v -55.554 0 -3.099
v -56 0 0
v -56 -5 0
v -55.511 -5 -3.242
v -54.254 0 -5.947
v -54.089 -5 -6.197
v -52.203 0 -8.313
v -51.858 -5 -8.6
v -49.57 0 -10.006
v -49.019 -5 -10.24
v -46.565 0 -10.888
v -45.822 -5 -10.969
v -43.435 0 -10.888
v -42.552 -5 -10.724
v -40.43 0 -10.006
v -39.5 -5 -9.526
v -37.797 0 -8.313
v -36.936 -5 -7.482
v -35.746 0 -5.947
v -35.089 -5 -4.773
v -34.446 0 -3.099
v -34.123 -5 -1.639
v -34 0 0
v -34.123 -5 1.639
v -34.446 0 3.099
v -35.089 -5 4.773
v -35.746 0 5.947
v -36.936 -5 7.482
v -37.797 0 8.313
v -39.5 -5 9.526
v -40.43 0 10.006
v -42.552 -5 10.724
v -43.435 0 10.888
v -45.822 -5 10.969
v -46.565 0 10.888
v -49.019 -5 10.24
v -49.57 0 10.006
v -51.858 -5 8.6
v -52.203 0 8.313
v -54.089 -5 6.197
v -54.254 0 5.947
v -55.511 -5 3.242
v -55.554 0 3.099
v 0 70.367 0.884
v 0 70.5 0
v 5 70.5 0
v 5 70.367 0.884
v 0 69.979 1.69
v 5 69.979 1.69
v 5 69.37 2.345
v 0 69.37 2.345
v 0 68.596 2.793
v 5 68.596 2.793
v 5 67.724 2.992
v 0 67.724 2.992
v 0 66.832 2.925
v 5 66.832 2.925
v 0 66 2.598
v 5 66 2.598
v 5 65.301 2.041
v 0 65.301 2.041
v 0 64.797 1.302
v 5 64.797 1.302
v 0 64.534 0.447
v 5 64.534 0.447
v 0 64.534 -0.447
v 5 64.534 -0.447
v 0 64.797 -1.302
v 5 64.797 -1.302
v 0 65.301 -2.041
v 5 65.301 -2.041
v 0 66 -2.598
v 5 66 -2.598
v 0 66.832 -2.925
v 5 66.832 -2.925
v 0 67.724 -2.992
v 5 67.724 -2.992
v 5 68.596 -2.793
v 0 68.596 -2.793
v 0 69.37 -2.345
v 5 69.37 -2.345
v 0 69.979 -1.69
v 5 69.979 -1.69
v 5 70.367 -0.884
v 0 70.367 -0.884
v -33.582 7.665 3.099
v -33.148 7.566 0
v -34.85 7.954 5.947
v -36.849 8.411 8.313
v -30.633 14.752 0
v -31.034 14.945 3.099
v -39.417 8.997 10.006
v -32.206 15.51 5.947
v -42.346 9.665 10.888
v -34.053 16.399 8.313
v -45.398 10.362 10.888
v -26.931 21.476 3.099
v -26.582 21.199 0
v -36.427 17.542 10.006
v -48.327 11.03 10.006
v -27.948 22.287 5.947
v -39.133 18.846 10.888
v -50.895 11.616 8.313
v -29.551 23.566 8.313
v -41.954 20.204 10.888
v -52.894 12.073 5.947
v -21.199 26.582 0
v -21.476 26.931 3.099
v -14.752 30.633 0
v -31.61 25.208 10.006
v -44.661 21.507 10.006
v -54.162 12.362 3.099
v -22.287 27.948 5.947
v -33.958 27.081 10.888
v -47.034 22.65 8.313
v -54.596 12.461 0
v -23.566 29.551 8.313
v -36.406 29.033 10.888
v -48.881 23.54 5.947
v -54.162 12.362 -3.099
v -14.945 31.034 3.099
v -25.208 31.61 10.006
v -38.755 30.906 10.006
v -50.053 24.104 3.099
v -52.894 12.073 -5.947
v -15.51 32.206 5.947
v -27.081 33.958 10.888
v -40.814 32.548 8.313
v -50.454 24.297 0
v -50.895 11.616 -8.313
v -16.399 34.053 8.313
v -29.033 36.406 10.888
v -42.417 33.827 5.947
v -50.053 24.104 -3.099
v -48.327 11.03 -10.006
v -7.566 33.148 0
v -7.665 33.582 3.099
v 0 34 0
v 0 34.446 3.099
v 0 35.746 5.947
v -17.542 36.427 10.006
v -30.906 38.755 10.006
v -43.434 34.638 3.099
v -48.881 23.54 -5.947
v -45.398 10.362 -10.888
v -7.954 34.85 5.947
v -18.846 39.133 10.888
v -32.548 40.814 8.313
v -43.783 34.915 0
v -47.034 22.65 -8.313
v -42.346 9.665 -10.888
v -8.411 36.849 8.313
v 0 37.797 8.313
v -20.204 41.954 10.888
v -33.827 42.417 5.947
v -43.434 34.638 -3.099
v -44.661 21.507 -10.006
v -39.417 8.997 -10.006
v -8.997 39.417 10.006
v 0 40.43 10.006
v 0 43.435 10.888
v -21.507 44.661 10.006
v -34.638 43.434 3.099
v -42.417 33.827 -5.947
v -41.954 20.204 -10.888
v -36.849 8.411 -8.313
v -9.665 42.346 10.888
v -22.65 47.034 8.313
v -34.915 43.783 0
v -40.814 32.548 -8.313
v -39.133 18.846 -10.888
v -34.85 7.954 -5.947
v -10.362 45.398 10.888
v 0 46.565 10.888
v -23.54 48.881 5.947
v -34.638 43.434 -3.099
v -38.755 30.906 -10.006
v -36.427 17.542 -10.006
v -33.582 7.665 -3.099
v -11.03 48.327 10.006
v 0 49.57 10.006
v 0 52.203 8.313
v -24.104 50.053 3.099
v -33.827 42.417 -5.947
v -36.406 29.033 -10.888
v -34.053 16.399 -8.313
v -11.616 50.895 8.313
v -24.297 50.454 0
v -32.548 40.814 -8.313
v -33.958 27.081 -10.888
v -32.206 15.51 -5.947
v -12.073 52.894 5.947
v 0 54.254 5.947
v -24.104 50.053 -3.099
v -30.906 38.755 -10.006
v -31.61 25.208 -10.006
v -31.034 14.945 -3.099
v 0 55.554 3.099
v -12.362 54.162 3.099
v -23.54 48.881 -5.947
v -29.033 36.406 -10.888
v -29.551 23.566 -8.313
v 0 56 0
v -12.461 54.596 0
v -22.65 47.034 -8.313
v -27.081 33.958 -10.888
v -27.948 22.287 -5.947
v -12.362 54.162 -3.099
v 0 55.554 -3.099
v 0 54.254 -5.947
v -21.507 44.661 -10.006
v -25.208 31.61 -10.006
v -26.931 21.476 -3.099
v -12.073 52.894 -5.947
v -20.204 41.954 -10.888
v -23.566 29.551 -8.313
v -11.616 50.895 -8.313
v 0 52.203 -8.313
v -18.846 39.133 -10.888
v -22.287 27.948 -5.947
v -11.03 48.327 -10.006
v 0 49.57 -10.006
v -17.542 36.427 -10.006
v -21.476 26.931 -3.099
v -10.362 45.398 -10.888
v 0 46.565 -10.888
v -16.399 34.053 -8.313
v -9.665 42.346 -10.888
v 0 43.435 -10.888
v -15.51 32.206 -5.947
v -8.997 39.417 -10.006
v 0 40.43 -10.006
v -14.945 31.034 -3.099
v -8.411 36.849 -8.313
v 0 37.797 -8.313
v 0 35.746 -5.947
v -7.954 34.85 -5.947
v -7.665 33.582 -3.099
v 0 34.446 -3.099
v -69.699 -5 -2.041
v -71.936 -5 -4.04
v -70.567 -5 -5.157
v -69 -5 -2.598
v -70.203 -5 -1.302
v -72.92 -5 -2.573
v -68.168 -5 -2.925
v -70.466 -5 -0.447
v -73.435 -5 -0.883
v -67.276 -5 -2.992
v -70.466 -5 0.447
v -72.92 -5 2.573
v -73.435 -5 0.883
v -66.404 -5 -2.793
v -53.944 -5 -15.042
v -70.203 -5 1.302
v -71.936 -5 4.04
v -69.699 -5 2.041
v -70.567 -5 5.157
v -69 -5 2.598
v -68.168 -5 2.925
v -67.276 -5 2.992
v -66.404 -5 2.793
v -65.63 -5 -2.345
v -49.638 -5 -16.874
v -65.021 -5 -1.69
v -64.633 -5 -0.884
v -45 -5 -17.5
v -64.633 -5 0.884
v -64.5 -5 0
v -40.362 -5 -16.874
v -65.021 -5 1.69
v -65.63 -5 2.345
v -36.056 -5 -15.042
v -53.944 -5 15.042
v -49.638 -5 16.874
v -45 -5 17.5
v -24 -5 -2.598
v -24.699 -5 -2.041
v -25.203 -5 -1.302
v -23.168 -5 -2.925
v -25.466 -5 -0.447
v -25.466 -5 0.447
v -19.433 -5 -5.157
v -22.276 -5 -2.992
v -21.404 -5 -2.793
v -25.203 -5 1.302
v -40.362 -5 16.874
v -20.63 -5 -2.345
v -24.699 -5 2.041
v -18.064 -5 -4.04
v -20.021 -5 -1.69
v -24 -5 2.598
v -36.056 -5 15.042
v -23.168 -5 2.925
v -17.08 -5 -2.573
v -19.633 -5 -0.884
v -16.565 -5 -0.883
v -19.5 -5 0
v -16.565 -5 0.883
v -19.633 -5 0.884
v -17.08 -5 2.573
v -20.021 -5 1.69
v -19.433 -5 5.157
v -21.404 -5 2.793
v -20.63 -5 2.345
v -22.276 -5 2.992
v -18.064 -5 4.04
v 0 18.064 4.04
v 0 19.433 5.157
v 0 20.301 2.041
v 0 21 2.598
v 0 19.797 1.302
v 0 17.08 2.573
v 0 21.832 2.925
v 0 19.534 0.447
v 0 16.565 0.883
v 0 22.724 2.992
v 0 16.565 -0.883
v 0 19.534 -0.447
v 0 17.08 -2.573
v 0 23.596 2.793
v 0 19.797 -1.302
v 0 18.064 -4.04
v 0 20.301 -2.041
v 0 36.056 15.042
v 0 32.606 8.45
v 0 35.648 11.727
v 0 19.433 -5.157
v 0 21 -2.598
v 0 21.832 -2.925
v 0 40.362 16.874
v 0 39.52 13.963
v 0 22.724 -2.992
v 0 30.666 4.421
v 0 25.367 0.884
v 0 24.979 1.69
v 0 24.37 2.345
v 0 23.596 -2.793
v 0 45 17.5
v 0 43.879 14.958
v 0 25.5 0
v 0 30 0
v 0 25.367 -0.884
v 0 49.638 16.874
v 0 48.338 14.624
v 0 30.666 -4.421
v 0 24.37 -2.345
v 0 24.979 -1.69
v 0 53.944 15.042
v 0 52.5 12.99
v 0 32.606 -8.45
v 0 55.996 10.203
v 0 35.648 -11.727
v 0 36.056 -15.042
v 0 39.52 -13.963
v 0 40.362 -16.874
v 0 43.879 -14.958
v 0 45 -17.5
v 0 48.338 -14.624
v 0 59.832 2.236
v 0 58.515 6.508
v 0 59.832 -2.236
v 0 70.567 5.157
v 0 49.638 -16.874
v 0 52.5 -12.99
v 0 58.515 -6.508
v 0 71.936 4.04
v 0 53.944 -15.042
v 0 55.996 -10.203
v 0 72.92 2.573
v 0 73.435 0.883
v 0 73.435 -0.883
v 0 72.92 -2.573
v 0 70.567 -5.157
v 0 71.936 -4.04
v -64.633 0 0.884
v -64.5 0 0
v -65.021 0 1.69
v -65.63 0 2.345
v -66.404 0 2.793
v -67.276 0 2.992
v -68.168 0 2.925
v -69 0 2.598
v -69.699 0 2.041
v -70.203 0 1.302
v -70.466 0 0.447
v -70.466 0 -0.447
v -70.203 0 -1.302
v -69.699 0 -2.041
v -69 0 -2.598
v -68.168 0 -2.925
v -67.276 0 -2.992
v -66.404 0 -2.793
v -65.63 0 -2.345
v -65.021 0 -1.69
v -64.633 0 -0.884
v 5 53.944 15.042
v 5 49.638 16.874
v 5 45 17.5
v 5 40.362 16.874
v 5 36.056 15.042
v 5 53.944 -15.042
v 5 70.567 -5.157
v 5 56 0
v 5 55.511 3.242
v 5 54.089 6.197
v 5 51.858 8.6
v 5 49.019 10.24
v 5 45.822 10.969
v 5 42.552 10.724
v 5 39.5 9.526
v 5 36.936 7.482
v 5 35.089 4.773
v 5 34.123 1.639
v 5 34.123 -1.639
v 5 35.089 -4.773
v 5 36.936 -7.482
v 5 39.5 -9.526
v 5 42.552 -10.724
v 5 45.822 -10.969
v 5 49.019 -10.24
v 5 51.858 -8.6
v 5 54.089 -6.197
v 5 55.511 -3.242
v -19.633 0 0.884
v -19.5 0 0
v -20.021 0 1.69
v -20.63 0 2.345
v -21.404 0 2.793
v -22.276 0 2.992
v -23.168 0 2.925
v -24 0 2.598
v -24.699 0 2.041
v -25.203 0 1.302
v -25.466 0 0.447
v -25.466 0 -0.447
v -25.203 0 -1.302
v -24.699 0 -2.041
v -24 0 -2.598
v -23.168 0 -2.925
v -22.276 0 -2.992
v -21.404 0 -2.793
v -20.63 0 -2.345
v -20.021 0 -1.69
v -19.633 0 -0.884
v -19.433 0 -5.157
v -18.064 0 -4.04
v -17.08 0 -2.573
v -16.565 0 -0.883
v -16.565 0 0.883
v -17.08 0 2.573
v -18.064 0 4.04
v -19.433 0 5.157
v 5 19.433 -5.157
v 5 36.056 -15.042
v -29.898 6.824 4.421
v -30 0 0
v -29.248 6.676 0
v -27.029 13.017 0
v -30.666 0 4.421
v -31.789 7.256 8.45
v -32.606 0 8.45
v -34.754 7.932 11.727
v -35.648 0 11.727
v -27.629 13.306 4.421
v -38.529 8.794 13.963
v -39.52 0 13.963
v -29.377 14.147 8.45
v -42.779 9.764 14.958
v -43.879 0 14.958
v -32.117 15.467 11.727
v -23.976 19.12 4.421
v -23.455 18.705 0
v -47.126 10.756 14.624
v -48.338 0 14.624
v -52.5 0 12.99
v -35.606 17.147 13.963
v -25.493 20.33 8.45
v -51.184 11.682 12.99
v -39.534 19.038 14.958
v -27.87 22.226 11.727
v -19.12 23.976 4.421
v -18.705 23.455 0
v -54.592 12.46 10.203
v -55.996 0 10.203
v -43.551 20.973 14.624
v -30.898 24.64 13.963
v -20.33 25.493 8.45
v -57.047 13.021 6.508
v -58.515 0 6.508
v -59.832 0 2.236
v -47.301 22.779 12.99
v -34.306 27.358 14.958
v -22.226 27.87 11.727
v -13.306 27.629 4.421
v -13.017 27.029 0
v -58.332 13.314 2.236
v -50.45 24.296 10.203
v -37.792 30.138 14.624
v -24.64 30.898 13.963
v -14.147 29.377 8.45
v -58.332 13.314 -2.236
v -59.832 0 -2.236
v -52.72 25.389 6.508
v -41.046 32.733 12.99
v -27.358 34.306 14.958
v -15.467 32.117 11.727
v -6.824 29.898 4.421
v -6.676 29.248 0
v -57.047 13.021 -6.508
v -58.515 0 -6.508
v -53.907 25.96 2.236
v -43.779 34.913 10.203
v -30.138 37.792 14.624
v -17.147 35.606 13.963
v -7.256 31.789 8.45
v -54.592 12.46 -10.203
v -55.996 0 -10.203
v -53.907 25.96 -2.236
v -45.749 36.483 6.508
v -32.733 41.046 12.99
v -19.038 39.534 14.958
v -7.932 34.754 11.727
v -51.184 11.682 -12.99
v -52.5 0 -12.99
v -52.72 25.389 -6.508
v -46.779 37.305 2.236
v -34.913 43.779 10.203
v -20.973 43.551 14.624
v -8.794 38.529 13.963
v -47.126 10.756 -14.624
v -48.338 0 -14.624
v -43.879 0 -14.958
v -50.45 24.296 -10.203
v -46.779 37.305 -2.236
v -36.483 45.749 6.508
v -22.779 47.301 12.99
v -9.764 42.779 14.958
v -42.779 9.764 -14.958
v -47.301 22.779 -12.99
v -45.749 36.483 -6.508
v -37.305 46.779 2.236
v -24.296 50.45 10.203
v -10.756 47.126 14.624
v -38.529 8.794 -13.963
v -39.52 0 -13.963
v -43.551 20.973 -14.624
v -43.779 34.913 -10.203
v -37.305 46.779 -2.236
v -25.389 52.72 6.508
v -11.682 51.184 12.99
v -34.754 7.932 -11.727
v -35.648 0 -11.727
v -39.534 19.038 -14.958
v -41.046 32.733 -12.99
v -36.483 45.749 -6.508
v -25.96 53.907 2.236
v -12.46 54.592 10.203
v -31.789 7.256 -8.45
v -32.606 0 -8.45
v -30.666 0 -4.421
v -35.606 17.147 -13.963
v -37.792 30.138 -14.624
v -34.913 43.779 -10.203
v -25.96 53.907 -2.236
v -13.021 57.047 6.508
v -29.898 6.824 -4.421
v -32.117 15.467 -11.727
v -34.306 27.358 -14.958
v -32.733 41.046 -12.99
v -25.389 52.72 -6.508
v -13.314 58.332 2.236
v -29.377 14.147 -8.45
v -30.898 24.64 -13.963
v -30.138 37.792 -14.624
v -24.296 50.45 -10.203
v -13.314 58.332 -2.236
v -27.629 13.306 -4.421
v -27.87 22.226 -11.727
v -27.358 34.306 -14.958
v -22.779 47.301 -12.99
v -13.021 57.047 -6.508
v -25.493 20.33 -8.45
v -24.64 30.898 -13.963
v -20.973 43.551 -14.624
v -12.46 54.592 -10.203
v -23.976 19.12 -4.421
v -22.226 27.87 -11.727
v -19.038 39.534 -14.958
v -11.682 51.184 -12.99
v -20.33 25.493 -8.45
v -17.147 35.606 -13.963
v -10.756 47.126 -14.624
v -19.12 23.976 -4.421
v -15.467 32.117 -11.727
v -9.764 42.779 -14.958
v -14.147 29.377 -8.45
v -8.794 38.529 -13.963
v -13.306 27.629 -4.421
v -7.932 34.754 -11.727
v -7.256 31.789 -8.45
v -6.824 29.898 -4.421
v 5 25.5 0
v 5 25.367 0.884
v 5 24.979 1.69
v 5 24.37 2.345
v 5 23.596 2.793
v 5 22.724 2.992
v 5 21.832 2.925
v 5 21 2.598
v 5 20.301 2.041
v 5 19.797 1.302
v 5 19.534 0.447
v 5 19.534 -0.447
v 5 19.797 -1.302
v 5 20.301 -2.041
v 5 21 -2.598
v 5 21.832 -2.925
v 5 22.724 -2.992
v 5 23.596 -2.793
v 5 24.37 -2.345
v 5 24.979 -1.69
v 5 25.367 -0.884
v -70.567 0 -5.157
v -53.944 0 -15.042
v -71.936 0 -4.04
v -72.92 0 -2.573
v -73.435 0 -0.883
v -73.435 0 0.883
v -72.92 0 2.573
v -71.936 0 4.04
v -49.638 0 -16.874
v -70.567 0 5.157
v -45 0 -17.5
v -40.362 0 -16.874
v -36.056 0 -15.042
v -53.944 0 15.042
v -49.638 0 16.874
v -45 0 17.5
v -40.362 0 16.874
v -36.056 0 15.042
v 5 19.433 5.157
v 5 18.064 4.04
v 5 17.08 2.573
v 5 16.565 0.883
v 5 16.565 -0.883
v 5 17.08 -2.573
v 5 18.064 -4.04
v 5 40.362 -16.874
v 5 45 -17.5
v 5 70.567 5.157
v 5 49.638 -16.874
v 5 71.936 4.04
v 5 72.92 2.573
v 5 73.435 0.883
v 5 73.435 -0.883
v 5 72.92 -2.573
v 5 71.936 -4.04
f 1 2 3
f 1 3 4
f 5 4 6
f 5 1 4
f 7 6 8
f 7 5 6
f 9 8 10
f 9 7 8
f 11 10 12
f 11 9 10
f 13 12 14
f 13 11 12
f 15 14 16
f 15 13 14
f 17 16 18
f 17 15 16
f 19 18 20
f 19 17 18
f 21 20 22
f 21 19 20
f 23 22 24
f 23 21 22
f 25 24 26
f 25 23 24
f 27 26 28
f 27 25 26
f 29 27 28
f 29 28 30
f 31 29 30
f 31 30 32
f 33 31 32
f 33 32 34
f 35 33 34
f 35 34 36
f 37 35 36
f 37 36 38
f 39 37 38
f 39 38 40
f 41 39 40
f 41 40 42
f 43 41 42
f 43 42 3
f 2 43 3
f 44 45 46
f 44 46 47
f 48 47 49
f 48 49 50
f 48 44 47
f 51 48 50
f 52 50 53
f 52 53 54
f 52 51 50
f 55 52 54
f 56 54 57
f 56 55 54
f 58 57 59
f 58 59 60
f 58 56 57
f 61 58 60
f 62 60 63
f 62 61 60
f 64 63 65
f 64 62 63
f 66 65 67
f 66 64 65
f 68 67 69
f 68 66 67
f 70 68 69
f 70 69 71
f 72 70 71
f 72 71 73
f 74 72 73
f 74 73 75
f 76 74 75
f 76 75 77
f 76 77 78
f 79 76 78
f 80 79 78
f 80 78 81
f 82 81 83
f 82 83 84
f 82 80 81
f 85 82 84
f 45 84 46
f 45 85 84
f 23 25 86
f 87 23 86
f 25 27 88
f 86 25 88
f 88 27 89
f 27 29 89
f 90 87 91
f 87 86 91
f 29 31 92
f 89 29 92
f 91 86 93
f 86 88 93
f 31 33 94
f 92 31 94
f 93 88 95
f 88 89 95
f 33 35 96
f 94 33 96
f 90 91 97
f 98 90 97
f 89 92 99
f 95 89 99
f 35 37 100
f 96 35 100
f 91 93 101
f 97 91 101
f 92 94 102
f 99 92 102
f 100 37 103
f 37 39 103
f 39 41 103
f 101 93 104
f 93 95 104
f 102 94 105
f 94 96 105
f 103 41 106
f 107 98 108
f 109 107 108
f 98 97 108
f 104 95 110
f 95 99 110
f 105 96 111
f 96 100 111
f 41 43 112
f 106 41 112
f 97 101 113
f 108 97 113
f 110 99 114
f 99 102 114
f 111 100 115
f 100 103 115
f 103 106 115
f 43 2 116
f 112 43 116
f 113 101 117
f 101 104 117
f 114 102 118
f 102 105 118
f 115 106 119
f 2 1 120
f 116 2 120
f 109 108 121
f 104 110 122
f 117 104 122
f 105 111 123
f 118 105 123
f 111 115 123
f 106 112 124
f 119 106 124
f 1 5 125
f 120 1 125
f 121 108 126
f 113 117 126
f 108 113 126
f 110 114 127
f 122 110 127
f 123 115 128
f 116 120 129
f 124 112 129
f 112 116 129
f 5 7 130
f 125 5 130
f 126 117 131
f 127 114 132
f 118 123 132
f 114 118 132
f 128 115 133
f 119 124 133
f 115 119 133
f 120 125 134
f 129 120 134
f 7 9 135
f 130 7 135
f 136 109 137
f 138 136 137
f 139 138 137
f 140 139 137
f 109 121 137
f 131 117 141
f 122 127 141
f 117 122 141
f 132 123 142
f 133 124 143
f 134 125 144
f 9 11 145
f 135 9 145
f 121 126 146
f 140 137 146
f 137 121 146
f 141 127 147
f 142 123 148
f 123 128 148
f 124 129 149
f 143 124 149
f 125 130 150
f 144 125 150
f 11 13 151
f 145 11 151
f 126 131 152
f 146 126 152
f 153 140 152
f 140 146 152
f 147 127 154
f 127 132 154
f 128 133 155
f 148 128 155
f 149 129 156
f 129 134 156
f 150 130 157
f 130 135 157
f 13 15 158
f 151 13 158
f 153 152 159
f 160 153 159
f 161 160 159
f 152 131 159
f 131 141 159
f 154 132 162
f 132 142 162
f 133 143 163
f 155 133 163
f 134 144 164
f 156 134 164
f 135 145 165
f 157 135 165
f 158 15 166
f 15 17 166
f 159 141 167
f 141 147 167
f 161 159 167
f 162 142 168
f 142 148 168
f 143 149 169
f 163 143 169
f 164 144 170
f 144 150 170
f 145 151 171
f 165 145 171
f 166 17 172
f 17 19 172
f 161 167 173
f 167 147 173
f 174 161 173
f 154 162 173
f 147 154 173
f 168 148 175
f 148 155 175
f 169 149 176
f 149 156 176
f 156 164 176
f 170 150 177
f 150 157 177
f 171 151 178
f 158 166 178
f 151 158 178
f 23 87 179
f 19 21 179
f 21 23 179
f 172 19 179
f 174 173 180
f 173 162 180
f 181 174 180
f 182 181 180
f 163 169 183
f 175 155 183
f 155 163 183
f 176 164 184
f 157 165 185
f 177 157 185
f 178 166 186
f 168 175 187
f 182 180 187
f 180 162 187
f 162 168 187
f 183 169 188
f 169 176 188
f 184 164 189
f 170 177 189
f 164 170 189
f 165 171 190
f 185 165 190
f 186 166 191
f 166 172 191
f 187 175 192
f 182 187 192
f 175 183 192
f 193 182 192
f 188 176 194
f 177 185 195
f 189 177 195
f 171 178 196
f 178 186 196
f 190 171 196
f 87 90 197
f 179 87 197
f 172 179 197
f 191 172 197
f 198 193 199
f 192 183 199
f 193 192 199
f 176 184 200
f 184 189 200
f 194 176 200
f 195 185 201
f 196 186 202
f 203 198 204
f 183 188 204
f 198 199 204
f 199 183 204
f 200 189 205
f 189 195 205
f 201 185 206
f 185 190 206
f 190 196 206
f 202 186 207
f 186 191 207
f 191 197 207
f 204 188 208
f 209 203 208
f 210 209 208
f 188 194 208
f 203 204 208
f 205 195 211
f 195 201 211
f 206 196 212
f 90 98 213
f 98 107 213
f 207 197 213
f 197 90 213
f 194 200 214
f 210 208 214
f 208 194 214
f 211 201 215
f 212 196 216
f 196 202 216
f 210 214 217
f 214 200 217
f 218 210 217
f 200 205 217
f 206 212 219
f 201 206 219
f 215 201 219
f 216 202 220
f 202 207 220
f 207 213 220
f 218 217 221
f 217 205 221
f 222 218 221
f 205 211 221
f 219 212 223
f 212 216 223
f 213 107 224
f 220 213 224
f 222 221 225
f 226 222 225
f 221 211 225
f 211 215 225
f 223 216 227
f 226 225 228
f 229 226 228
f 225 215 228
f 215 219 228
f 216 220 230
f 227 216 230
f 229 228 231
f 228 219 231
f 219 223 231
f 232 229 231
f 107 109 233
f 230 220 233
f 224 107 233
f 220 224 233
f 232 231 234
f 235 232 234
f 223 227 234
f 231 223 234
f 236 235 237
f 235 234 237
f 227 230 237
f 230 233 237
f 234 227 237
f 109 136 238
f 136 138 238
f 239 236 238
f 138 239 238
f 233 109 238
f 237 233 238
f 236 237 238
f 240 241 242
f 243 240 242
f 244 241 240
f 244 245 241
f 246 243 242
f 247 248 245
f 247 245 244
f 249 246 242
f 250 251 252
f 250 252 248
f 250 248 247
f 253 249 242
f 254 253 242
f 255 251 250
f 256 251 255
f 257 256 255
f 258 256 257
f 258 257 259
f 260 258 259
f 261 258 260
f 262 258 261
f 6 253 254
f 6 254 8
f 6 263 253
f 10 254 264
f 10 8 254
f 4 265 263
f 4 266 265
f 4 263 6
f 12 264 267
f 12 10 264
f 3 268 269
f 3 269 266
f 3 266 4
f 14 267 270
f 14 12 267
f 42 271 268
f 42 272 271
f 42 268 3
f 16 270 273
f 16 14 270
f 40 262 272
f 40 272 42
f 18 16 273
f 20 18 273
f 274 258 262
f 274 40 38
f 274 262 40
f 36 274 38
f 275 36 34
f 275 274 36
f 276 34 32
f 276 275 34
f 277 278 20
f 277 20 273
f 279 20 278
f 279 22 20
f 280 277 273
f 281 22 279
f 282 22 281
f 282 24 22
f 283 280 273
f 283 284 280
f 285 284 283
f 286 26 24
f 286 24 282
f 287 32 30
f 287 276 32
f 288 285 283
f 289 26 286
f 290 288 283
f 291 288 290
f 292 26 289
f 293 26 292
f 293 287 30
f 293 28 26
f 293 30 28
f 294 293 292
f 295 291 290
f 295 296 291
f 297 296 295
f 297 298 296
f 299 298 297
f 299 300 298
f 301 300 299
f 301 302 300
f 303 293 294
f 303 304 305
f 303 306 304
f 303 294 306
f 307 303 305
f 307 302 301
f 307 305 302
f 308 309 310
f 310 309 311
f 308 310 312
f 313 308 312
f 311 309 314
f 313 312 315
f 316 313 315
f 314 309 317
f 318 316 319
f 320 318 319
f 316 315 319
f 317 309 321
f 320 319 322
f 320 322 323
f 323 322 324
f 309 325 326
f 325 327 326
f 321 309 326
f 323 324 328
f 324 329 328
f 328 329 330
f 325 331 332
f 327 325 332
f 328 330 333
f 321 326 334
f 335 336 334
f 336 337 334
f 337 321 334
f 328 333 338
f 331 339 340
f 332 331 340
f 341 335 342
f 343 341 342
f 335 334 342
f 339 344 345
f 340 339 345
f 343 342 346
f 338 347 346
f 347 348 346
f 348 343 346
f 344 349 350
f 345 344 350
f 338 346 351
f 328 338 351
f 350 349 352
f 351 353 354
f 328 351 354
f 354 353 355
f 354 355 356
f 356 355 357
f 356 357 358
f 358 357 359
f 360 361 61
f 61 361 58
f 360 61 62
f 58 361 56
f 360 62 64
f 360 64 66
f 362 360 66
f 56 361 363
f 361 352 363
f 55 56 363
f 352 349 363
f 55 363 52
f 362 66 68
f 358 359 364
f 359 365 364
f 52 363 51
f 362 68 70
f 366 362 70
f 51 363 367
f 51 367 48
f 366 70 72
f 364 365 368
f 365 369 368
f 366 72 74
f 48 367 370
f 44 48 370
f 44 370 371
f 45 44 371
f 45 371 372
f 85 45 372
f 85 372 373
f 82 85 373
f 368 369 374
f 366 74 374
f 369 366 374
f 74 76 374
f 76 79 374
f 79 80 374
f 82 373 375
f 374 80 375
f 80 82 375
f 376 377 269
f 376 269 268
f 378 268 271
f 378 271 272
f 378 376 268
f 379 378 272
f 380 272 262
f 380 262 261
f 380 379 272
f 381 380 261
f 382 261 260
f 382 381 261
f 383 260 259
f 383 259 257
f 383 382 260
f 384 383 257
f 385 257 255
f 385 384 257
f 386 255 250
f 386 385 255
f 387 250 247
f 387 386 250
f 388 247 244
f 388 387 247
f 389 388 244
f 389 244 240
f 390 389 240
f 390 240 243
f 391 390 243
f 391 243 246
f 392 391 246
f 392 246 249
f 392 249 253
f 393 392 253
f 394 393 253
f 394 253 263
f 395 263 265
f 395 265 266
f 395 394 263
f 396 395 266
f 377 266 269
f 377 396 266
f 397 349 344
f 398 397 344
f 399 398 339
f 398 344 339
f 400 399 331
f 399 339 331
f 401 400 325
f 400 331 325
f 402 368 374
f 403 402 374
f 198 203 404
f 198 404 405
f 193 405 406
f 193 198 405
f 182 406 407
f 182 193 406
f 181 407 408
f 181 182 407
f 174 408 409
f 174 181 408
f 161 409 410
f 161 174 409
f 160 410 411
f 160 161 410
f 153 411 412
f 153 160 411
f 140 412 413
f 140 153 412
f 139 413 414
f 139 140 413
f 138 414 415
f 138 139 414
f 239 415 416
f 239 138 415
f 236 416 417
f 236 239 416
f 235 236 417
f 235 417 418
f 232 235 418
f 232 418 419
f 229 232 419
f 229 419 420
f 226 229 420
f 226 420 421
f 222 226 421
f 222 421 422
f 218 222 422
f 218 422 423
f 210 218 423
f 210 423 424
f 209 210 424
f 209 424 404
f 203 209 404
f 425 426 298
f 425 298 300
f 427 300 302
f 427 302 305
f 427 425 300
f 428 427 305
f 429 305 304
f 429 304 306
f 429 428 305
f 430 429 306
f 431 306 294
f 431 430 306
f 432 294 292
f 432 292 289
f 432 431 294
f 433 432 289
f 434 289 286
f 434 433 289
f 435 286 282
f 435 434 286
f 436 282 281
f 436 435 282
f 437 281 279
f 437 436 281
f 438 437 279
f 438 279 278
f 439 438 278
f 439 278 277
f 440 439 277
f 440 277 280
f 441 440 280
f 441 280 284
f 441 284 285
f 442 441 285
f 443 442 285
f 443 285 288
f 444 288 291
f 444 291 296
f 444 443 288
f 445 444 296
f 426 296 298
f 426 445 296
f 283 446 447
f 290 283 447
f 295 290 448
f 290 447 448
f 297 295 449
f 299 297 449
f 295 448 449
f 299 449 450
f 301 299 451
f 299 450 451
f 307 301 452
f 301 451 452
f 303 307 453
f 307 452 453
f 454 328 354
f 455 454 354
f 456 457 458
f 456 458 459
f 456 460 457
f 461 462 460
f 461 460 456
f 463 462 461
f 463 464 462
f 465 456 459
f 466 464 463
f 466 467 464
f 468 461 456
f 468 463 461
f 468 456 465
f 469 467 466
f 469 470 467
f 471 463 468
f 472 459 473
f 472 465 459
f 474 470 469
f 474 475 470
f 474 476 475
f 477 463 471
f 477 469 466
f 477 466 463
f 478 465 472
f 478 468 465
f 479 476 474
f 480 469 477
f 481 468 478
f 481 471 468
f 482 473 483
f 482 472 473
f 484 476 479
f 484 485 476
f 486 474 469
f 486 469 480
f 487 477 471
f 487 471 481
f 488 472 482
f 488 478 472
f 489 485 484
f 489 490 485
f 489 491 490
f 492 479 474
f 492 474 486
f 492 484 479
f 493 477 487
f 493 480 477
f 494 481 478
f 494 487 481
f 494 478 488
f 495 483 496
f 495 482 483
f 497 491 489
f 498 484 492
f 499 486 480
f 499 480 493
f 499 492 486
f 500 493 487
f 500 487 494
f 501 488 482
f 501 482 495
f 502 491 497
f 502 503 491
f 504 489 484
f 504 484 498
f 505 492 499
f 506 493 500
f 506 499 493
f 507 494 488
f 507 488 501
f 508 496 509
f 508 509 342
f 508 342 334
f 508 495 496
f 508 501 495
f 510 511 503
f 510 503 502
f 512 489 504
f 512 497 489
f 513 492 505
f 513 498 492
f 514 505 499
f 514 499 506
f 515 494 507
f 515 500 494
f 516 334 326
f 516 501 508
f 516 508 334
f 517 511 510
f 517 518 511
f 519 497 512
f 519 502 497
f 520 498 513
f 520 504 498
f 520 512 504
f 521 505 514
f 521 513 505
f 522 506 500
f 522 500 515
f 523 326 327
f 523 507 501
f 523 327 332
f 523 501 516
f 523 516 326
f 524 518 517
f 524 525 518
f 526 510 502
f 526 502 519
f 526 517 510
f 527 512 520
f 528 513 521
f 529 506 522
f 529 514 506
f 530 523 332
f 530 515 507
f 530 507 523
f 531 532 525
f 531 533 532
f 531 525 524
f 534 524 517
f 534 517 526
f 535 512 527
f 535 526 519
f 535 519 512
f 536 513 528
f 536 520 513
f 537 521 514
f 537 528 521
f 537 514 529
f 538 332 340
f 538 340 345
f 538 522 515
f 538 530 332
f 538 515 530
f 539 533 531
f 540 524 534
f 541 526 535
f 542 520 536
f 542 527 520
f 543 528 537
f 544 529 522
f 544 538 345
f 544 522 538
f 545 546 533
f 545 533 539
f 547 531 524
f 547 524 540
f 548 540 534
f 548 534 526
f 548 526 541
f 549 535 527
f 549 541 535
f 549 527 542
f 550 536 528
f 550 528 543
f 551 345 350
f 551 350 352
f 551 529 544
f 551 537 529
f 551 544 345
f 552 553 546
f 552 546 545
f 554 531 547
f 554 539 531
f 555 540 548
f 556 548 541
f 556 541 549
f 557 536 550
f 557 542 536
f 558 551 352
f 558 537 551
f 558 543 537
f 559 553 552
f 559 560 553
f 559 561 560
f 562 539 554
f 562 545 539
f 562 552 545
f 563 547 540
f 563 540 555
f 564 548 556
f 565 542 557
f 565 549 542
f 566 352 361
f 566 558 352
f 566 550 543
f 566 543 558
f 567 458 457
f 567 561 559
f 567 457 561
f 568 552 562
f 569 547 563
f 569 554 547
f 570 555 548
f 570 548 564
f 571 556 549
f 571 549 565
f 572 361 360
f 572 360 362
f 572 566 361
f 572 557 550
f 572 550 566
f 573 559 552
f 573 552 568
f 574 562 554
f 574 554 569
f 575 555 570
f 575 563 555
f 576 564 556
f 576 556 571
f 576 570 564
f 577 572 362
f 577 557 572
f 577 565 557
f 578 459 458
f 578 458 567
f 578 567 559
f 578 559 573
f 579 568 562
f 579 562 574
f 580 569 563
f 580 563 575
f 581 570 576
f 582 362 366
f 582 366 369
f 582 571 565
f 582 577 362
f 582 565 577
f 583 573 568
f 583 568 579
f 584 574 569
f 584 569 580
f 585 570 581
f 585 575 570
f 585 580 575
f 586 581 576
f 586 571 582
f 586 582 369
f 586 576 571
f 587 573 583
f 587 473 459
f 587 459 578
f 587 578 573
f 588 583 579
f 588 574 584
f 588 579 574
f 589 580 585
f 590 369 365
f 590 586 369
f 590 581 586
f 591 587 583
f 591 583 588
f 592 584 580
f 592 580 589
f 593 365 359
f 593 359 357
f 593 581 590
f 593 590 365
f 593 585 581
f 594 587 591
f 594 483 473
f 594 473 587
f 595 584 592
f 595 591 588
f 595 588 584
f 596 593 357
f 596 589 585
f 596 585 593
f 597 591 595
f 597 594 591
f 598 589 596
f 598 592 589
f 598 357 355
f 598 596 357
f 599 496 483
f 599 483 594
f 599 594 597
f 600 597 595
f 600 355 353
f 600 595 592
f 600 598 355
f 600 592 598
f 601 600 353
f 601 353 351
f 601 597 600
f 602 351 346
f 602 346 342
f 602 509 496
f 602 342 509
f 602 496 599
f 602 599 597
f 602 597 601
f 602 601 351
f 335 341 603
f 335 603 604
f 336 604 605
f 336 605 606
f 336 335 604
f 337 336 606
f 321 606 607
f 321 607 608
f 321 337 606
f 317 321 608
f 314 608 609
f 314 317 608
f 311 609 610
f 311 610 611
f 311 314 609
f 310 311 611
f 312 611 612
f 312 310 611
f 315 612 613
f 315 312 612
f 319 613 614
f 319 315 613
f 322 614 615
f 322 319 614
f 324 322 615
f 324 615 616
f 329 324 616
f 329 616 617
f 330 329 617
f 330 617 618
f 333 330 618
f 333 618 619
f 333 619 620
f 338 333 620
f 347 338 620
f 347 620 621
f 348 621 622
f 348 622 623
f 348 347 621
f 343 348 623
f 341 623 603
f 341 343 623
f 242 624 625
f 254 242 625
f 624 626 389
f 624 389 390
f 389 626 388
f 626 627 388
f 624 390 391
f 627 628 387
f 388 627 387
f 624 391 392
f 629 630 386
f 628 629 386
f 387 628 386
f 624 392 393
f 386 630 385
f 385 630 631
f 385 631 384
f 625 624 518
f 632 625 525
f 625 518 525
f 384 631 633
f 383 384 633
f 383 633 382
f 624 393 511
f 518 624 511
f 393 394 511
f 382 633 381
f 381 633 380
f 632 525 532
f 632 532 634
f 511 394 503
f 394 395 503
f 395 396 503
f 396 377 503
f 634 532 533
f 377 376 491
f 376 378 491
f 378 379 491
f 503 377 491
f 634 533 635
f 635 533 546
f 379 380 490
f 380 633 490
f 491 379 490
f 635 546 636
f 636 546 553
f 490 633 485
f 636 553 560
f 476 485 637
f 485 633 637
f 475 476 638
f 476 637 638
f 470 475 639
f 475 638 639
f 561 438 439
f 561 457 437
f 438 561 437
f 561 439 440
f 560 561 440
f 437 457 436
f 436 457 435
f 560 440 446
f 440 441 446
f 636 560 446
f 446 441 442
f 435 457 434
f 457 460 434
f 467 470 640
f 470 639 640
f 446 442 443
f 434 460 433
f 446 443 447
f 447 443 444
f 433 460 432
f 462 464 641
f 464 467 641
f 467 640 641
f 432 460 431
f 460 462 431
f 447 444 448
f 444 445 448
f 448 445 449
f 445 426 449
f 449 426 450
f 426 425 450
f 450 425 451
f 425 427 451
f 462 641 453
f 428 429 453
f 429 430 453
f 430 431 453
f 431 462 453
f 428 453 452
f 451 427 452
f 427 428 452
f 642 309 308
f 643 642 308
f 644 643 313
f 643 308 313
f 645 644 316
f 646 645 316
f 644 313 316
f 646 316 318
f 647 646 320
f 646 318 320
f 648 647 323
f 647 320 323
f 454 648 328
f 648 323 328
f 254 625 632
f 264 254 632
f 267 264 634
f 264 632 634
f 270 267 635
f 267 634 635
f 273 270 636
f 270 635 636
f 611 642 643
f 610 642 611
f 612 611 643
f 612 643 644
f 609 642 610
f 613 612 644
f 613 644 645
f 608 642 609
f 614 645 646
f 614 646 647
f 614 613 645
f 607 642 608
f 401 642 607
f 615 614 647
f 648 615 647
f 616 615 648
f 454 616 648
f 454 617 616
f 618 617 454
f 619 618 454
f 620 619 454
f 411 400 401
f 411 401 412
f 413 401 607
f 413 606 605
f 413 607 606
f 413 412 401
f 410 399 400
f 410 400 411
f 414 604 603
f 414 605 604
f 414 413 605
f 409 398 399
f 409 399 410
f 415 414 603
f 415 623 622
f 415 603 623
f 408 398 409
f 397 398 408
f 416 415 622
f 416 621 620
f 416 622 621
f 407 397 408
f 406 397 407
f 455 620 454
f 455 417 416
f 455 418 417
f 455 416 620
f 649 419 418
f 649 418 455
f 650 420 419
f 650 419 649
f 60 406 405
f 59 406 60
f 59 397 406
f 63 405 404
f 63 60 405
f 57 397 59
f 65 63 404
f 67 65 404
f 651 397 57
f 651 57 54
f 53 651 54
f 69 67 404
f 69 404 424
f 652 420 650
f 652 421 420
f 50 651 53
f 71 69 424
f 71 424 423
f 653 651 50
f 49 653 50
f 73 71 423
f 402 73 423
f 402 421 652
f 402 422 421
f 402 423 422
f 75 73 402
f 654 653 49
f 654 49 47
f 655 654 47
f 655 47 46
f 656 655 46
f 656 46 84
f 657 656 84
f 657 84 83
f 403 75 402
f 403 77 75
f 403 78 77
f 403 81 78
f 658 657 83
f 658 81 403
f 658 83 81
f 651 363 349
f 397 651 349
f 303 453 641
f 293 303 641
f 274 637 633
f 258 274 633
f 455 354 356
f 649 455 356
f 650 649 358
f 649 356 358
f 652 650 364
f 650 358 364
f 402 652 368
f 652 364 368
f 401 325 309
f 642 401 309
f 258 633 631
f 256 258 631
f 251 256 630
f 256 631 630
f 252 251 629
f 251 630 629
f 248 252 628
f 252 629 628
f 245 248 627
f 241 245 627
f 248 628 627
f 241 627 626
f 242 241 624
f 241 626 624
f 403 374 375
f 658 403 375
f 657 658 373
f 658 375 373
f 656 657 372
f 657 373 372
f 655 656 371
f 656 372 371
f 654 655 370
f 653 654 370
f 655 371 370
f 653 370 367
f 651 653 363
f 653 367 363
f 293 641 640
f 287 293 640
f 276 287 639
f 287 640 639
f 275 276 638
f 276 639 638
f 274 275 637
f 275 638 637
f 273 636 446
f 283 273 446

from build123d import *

# Parameters (mm, degrees)
SWEEP_THIN1_PROFILE_R   = 15
SWEEP_THIN1_PROFILE_R_2 = 11
SKETCH65_R              = 11
SKETCH65_R_2            = 3
BOSS_EXTRUDE1_DEPTH     = 5
SKETCH66_R              = 11
SKETCH66_R_2            = 3
BOSS_EXTRUDE2_DEPTH     = 5


with BuildPart() as part:
    # Sweep-Thin1: sweep along a path in Sketch1
    with BuildLine(Plane.XY) as sweep_thin1_path:
        ThreePointArc((-45, 0), (-31.819805153, 31.819805153), (0, 45))
    # Sweep-Thin1 profile (on start of the path) → Sweep-Thin1 (sweep)
    with BuildSketch(Plane(origin=(-45, 0, 0), x_dir=(1, 0, 0), z_dir=(0, 1, 0))):
        Circle(SWEEP_THIN1_PROFILE_R)
        Circle(SWEEP_THIN1_PROFILE_R_2, mode=Mode.SUBTRACT)
    sweep(path=sweep_thin1_path.line)

    # Sketch65 → Boss-Extrude1 (add)
    with BuildSketch(Plane(origin=(0, 0, 0), x_dir=(0, 0, -1), z_dir=(1, 0, 0))):
        with BuildLine():
            Line((-5.157087895, 70.566666667), (-15.04150636, 53.944444444))
            ThreePointArc((-15.04150636, 53.944444444), (-17.5, 45), (-15.04150636, 36.055555556))
            Line((-15.04150636, 36.055555556), (-5.157087895, 19.433333333))
            ThreePointArc((-5.157087895, 19.433333333), (0, 16.5), (5.157087895, 19.433333333))
            Line((5.157087895, 19.433333333), (15.04150636, 36.055555556))
            ThreePointArc((15.04150636, 36.055555556), (17.5, 45), (15.04150636, 53.944444444))
            Line((15.04150636, 53.944444444), (5.157087895, 70.566666667))
            ThreePointArc((5.157087895, 70.566666667), (0, 73.5), (-5.157087895, 70.566666667))
        make_face()
        with Locations(Location((0, 45, 0), (0, 0, 90))):
            Circle(SKETCH65_R, mode=Mode.SUBTRACT)
        with Locations(Location((0, 67.5, 0), (0, 0, 90))):
            Circle(SKETCH65_R_2, mode=Mode.SUBTRACT)
        with Locations(Location((0, 22.5, 0), (0, 0, 90))):
            Circle(SKETCH65_R_2, mode=Mode.SUBTRACT)
    extrude(amount=BOSS_EXTRUDE1_DEPTH)

    # Sketch66 → Boss-Extrude2 (add)
    with BuildSketch(Plane.XZ):
        with BuildLine():
            Line((-53.944444444, 15.04150636), (-70.566666667, 5.157087895))
            ThreePointArc((-70.566666667, 5.157087895), (-73.5, 0), (-70.566666667, -5.157087895))
            Line((-70.566666667, -5.157087895), (-53.944444444, -15.04150636))
            ThreePointArc((-53.944444444, -15.04150636), (-45, -17.5), (-36.055555556, -15.04150636))
            Line((-36.055555556, -15.04150636), (-19.433333333, -5.157087895))
            ThreePointArc((-19.433333333, -5.157087895), (-16.5, 0), (-19.433333333, 5.157087895))
            Line((-19.433333333, 5.157087895), (-36.055555556, 15.04150636))
            ThreePointArc((-36.055555556, 15.04150636), (-45, 17.5), (-53.944444444, 15.04150636))
        make_face()
        with Locations(Location((-45, 0, 0), (0, 0, 180))):
            Circle(SKETCH66_R, mode=Mode.SUBTRACT)
        with Locations((-67.5, 0)):
            Circle(SKETCH66_R_2, mode=Mode.SUBTRACT)
        with Locations((-22.5, 0)):
            Circle(SKETCH66_R_2, mode=Mode.SUBTRACT)
    extrude(amount=BOSS_EXTRUDE2_DEPTH)


solid = part.part
